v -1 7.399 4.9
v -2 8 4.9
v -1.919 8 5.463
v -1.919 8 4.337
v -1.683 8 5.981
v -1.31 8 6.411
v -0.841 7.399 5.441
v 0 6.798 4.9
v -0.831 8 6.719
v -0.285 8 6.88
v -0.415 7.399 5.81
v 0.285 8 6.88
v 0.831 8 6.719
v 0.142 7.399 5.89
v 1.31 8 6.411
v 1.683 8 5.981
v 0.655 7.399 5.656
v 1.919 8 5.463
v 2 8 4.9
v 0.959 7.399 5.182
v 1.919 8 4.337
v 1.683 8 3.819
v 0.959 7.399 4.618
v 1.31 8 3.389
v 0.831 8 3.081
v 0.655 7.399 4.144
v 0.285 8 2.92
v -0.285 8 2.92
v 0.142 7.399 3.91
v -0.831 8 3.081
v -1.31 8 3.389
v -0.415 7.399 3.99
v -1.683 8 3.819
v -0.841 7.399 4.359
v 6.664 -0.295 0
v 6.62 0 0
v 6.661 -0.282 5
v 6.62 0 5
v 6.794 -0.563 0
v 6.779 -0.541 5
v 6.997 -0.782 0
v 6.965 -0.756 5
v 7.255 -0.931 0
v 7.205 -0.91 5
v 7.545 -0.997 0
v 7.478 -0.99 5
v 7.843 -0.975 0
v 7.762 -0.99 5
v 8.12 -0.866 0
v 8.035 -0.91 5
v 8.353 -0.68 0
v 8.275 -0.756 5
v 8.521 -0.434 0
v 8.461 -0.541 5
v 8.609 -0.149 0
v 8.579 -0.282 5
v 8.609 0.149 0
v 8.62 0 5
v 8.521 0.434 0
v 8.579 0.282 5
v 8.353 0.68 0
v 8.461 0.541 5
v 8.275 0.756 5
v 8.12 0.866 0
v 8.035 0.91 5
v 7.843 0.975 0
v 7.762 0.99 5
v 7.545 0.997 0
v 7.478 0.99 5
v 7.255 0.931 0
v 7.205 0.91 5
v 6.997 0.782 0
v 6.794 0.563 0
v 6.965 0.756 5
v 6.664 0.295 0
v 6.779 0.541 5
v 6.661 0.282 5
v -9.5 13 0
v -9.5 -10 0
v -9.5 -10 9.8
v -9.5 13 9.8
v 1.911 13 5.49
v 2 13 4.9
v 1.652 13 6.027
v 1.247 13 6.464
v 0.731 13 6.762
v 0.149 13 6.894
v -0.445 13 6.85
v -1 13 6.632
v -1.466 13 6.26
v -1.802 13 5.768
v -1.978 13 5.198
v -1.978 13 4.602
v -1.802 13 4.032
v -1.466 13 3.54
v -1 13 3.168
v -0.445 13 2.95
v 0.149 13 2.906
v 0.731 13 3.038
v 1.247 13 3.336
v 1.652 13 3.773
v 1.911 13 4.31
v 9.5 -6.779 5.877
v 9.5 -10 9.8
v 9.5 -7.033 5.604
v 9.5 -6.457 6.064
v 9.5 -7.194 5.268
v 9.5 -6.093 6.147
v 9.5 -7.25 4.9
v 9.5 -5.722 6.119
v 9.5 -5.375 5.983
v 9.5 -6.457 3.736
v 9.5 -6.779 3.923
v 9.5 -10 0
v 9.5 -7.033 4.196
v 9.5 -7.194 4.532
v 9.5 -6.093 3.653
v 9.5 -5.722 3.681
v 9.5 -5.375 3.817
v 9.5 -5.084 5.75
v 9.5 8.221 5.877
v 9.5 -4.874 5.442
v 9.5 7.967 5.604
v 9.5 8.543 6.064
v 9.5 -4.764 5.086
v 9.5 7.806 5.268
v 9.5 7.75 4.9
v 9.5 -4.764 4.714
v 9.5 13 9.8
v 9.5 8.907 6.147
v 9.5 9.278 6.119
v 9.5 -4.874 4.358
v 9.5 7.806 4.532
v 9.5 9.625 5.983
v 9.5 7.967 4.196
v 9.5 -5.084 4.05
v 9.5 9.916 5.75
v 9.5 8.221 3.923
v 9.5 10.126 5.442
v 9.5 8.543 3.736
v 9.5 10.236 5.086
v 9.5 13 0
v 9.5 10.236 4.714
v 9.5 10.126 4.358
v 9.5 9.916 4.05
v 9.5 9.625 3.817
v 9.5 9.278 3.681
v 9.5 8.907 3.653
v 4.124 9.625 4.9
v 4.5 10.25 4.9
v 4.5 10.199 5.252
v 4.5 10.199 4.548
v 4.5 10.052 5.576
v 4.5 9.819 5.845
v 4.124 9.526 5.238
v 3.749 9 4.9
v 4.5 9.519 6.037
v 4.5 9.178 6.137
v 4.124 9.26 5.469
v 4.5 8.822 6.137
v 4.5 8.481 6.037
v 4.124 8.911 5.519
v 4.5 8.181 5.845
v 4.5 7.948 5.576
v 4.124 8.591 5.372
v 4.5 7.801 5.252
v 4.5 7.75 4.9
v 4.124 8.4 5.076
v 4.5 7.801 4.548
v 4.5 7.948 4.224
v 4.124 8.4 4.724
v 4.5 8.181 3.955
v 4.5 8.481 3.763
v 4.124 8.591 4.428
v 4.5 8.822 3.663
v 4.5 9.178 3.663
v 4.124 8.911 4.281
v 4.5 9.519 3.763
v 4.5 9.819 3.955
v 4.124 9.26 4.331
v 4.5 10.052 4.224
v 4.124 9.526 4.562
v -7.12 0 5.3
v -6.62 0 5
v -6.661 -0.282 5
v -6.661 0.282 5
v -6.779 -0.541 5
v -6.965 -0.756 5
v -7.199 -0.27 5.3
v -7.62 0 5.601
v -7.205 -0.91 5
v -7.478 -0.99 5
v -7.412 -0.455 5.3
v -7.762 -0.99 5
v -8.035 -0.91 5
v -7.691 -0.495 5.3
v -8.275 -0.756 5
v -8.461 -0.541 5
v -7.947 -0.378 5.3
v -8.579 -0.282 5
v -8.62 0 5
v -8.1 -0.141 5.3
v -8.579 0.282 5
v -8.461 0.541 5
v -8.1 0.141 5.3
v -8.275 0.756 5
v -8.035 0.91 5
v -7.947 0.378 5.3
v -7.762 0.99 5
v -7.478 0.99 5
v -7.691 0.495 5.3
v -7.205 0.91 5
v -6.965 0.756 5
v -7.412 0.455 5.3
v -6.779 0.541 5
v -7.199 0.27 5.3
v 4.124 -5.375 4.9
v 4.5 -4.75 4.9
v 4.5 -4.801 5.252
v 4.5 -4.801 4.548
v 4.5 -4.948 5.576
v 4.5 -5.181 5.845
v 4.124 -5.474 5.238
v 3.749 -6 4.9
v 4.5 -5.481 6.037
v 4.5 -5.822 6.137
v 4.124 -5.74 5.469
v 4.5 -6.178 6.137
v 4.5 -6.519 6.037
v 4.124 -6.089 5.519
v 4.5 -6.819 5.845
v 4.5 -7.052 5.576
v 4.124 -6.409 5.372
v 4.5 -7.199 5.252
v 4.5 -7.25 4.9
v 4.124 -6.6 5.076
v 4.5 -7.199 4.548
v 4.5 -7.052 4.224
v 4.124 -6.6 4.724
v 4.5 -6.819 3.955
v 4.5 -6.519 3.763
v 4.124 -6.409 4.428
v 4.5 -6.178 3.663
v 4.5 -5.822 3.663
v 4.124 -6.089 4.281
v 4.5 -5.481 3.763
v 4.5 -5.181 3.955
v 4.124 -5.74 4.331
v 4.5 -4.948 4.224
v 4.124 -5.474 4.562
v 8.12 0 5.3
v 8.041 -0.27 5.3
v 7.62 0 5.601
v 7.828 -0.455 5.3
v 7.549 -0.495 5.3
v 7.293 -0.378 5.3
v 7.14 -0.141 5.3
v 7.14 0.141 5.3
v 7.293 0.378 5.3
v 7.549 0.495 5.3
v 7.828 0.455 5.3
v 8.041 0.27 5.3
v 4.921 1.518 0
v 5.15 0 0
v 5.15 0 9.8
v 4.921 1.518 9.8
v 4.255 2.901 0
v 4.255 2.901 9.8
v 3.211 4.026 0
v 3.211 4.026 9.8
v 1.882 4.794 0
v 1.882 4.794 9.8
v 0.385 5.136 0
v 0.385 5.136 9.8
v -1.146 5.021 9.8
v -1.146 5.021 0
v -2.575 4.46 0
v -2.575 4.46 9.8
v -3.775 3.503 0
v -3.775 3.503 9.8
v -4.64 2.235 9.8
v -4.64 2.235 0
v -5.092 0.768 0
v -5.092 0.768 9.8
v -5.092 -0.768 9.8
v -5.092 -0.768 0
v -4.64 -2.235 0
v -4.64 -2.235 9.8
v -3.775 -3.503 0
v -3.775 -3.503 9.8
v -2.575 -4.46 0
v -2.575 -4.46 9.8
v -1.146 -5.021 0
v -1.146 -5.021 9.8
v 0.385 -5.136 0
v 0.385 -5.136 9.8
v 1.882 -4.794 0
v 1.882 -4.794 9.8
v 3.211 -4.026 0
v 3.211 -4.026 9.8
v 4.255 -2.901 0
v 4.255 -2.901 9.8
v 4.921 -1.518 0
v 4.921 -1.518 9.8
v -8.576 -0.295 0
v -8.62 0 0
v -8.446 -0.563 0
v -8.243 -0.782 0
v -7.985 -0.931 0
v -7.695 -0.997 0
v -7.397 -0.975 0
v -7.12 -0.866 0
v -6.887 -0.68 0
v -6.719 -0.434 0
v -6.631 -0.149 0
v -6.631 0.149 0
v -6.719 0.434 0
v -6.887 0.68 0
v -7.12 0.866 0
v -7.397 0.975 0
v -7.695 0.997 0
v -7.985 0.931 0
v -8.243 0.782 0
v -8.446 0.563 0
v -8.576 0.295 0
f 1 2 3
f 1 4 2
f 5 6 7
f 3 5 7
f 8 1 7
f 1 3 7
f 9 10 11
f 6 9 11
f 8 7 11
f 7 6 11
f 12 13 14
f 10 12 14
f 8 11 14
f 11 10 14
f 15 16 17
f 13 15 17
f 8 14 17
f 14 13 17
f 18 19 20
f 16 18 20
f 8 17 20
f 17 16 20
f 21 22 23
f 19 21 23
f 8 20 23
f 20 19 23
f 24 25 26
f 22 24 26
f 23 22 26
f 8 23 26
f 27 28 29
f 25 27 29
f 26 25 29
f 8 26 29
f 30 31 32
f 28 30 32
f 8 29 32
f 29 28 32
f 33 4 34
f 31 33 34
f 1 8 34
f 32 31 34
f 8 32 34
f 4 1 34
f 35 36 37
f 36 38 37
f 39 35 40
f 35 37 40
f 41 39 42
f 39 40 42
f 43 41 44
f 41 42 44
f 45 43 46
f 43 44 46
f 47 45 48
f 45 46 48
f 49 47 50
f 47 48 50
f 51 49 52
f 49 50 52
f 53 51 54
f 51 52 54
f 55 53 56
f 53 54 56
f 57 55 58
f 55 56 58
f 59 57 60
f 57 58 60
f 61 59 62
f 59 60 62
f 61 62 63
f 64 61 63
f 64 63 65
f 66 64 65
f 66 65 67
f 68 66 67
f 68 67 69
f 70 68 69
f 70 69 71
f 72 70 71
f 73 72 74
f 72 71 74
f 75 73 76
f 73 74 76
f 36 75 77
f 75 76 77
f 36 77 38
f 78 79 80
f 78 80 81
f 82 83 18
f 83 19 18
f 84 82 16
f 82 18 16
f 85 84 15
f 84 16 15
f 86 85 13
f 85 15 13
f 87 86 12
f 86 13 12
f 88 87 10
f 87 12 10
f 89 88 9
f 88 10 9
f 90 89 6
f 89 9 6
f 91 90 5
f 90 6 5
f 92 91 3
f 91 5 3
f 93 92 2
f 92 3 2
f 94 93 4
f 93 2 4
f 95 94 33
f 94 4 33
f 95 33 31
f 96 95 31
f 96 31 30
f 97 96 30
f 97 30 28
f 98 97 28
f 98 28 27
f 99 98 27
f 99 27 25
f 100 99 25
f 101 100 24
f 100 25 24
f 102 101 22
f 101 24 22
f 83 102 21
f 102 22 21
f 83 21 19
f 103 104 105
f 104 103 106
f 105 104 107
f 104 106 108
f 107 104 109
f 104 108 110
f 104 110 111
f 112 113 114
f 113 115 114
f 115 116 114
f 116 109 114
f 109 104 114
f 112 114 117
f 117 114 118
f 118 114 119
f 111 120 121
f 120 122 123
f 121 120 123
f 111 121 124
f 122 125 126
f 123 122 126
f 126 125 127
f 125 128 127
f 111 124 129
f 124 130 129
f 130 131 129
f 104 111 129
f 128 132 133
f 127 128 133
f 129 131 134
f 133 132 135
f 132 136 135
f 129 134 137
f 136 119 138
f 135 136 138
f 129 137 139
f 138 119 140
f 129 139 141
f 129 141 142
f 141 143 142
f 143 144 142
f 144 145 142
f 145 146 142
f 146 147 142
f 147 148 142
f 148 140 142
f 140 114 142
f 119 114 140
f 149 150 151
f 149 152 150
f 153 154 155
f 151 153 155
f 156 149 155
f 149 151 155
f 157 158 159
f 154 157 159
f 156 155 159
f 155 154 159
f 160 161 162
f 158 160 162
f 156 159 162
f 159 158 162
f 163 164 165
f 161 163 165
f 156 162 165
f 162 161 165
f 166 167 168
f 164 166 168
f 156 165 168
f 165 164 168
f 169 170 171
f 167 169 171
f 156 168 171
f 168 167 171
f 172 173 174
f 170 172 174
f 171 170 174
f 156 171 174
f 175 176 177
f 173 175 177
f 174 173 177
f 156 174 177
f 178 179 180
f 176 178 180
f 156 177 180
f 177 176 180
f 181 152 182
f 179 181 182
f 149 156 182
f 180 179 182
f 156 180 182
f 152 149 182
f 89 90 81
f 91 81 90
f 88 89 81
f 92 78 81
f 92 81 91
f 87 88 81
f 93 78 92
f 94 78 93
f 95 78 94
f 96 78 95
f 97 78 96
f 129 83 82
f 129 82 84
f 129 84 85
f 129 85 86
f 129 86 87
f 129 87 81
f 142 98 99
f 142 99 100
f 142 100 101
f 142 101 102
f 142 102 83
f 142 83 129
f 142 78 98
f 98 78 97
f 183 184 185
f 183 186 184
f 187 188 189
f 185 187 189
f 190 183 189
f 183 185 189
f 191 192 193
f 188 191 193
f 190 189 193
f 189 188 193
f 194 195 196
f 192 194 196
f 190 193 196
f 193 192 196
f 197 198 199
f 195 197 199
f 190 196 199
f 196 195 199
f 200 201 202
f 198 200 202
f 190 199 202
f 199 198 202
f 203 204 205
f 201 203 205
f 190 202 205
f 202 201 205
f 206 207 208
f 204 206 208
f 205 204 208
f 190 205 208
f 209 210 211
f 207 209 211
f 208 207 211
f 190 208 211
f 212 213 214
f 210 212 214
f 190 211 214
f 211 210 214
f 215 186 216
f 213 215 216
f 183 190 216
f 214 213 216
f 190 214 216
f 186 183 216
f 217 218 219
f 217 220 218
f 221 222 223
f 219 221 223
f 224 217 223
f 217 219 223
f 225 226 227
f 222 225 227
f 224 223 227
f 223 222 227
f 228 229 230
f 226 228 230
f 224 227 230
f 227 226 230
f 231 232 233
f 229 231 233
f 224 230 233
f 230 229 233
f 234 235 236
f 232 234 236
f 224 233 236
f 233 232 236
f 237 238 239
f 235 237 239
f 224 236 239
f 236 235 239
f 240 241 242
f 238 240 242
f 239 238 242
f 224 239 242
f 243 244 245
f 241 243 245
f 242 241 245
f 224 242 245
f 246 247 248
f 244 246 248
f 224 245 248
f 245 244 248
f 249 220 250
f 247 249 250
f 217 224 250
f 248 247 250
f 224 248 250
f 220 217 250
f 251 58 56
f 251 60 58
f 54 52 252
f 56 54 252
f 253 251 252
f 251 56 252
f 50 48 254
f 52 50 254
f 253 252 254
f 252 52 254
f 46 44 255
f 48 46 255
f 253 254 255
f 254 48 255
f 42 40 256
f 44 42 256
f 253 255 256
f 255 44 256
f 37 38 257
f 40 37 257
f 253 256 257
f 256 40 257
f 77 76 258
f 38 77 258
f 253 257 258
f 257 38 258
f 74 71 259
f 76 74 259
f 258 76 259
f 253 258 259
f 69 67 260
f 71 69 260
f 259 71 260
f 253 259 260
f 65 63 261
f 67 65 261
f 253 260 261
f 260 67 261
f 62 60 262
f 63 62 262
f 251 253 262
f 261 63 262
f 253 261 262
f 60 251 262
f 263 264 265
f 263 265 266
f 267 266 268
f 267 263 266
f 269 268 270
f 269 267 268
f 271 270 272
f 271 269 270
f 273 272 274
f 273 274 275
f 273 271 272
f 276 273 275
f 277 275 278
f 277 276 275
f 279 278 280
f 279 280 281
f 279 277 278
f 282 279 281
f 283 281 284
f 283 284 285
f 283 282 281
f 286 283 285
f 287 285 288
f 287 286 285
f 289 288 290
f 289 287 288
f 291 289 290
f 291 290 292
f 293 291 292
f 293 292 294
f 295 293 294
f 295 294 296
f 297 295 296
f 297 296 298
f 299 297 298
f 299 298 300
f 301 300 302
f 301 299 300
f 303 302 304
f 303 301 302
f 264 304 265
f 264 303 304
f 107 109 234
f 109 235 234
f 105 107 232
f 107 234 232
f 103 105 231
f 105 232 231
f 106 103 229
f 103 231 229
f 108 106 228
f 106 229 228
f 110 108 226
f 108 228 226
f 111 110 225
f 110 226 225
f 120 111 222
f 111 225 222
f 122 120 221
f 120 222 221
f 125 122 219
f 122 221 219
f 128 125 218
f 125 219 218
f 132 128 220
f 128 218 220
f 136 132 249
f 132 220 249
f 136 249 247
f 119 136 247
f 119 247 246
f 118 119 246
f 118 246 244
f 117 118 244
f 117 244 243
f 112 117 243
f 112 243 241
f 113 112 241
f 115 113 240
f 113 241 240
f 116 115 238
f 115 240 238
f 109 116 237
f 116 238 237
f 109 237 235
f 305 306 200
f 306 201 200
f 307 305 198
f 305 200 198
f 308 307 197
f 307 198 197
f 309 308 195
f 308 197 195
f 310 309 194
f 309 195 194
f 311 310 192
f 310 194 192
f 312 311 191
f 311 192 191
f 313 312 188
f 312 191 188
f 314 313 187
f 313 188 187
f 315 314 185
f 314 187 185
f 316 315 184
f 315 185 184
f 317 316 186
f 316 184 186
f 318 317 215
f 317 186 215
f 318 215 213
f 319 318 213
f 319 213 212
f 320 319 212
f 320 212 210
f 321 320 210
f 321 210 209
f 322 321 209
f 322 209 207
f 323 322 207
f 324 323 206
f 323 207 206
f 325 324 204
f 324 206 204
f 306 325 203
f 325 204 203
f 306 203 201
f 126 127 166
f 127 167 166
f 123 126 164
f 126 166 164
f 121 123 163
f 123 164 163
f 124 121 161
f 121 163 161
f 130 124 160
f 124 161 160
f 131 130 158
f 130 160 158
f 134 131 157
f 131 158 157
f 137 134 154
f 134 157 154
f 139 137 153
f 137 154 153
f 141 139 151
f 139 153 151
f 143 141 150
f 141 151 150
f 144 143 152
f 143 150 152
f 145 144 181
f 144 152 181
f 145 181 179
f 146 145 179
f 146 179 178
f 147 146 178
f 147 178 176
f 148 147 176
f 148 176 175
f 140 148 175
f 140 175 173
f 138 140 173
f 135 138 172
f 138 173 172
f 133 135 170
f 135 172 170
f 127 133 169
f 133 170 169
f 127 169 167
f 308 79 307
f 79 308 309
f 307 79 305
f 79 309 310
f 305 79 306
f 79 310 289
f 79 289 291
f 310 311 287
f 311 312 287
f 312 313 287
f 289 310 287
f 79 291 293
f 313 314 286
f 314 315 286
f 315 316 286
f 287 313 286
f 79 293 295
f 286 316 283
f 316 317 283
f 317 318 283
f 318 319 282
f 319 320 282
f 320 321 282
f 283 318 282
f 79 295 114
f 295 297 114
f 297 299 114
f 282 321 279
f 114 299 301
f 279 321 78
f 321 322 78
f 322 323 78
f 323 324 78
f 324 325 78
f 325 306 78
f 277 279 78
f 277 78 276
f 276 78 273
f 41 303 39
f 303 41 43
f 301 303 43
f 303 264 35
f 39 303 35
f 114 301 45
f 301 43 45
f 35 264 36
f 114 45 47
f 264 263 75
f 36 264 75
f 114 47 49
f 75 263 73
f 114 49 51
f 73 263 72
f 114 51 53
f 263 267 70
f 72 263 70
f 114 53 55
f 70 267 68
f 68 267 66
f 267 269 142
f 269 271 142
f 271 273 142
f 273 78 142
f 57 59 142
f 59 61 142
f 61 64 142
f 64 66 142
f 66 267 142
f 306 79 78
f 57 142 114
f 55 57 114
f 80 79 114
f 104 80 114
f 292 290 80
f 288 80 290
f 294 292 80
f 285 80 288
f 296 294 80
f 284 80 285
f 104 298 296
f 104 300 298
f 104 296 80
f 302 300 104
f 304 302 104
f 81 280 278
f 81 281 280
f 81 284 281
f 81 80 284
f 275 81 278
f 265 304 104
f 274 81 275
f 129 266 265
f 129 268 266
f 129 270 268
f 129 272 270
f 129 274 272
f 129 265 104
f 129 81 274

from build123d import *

# Parameters (mm, degrees)
F0_W     = 19
F0_H     = 23
F0_R     = 5.15
F1_DEPTH = 9.8
F3_D     = 2
F3_DEPTH = 5
F3_TIP   = 0.600860619
F5_D     = 4
F5_DEPTH = 5
F5_TIP   = 1.2017212381
F7_D     = 2.5
F7_DEPTH = 5
F7_TIP   = 0.7510757738


with BuildPart() as f1:
    # F0 (on Top) → F1 (new body)
    with BuildSketch(Plane.XY):
        with Locations((0, 1.5)):
            Rectangle(F0_W, F0_H)
        Circle(F0_R, mode=Mode.SUBTRACT)
    extrude(amount=F1_DEPTH)

    # F3
    with Locations(Plane(origin=(0, 0, 0), x_dir=(1, 0, 0), z_dir=(0, 0, -1))):
        with Locations((-7.62, 0), (7.62, 0)):
            Hole(F3_D / 2, depth=F3_DEPTH)
            with Locations((0, 0, -(F3_DEPTH + F3_TIP / 2))):  # 118° drill point
                Cone(0, F3_D / 2, F3_TIP, mode=Mode.SUBTRACT)

    # F5
    with Locations(Plane(origin=(0, 13, 0), x_dir=(-1, 0, 0), z_dir=(0, 1, 0))):
        with Locations((0, 4.9)):
            Hole(F5_D / 2, depth=F5_DEPTH)
            with Locations((0, 0, -(F5_DEPTH + F5_TIP / 2))):  # 118° drill point
                Cone(0, F5_D / 2, F5_TIP, mode=Mode.SUBTRACT)

    # F7
    with Locations(Plane.YZ.offset(9.5)):
        with Locations((-6, 4.9), (9, 4.9)):
            Hole(F7_D / 2, depth=F7_DEPTH)
            with Locations((0, 0, -(F7_DEPTH + F7_TIP / 2))):  # 118° drill point
                Cone(0, F7_D / 2, F7_TIP, mode=Mode.SUBTRACT)


solid = f1.part
